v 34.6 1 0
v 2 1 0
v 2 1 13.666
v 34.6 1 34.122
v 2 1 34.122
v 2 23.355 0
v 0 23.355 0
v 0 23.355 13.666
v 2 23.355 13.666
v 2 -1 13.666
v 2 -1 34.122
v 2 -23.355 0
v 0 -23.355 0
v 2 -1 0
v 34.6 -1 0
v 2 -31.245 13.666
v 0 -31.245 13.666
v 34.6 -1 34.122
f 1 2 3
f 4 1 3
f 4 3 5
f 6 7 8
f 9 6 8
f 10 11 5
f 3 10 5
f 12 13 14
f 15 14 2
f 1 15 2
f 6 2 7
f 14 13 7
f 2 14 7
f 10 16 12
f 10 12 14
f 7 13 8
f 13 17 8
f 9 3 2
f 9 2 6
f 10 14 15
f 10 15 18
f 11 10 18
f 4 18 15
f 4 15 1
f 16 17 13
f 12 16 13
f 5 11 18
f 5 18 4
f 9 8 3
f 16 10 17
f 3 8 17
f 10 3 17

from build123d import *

# Parameters (mm, degrees)
PAD_DEPTH    = 2
SKETCH001_W  = 2
SKETCH001_H  = 34.122
PAD001_DEPTH = 32.6


with BuildPart() as part:
    # Sketch → Pad (new body)
    with BuildSketch(Plane.YZ):
        Polygon((-23.355, 0), (23.355, 0), (23.355, 13.665881), (-31.245, 13.665881), align=None)
    extrude(amount=PAD_DEPTH)

    # Sketch001 (on Face6 of Pad) → Pad001 (join)
    with BuildSketch(Plane.YZ.offset(2)):
        with Locations((0, 17.061)):
            Rectangle(SKETCH001_W, SKETCH001_H)
    extrude(amount=PAD001_DEPTH)


solid = part.part
